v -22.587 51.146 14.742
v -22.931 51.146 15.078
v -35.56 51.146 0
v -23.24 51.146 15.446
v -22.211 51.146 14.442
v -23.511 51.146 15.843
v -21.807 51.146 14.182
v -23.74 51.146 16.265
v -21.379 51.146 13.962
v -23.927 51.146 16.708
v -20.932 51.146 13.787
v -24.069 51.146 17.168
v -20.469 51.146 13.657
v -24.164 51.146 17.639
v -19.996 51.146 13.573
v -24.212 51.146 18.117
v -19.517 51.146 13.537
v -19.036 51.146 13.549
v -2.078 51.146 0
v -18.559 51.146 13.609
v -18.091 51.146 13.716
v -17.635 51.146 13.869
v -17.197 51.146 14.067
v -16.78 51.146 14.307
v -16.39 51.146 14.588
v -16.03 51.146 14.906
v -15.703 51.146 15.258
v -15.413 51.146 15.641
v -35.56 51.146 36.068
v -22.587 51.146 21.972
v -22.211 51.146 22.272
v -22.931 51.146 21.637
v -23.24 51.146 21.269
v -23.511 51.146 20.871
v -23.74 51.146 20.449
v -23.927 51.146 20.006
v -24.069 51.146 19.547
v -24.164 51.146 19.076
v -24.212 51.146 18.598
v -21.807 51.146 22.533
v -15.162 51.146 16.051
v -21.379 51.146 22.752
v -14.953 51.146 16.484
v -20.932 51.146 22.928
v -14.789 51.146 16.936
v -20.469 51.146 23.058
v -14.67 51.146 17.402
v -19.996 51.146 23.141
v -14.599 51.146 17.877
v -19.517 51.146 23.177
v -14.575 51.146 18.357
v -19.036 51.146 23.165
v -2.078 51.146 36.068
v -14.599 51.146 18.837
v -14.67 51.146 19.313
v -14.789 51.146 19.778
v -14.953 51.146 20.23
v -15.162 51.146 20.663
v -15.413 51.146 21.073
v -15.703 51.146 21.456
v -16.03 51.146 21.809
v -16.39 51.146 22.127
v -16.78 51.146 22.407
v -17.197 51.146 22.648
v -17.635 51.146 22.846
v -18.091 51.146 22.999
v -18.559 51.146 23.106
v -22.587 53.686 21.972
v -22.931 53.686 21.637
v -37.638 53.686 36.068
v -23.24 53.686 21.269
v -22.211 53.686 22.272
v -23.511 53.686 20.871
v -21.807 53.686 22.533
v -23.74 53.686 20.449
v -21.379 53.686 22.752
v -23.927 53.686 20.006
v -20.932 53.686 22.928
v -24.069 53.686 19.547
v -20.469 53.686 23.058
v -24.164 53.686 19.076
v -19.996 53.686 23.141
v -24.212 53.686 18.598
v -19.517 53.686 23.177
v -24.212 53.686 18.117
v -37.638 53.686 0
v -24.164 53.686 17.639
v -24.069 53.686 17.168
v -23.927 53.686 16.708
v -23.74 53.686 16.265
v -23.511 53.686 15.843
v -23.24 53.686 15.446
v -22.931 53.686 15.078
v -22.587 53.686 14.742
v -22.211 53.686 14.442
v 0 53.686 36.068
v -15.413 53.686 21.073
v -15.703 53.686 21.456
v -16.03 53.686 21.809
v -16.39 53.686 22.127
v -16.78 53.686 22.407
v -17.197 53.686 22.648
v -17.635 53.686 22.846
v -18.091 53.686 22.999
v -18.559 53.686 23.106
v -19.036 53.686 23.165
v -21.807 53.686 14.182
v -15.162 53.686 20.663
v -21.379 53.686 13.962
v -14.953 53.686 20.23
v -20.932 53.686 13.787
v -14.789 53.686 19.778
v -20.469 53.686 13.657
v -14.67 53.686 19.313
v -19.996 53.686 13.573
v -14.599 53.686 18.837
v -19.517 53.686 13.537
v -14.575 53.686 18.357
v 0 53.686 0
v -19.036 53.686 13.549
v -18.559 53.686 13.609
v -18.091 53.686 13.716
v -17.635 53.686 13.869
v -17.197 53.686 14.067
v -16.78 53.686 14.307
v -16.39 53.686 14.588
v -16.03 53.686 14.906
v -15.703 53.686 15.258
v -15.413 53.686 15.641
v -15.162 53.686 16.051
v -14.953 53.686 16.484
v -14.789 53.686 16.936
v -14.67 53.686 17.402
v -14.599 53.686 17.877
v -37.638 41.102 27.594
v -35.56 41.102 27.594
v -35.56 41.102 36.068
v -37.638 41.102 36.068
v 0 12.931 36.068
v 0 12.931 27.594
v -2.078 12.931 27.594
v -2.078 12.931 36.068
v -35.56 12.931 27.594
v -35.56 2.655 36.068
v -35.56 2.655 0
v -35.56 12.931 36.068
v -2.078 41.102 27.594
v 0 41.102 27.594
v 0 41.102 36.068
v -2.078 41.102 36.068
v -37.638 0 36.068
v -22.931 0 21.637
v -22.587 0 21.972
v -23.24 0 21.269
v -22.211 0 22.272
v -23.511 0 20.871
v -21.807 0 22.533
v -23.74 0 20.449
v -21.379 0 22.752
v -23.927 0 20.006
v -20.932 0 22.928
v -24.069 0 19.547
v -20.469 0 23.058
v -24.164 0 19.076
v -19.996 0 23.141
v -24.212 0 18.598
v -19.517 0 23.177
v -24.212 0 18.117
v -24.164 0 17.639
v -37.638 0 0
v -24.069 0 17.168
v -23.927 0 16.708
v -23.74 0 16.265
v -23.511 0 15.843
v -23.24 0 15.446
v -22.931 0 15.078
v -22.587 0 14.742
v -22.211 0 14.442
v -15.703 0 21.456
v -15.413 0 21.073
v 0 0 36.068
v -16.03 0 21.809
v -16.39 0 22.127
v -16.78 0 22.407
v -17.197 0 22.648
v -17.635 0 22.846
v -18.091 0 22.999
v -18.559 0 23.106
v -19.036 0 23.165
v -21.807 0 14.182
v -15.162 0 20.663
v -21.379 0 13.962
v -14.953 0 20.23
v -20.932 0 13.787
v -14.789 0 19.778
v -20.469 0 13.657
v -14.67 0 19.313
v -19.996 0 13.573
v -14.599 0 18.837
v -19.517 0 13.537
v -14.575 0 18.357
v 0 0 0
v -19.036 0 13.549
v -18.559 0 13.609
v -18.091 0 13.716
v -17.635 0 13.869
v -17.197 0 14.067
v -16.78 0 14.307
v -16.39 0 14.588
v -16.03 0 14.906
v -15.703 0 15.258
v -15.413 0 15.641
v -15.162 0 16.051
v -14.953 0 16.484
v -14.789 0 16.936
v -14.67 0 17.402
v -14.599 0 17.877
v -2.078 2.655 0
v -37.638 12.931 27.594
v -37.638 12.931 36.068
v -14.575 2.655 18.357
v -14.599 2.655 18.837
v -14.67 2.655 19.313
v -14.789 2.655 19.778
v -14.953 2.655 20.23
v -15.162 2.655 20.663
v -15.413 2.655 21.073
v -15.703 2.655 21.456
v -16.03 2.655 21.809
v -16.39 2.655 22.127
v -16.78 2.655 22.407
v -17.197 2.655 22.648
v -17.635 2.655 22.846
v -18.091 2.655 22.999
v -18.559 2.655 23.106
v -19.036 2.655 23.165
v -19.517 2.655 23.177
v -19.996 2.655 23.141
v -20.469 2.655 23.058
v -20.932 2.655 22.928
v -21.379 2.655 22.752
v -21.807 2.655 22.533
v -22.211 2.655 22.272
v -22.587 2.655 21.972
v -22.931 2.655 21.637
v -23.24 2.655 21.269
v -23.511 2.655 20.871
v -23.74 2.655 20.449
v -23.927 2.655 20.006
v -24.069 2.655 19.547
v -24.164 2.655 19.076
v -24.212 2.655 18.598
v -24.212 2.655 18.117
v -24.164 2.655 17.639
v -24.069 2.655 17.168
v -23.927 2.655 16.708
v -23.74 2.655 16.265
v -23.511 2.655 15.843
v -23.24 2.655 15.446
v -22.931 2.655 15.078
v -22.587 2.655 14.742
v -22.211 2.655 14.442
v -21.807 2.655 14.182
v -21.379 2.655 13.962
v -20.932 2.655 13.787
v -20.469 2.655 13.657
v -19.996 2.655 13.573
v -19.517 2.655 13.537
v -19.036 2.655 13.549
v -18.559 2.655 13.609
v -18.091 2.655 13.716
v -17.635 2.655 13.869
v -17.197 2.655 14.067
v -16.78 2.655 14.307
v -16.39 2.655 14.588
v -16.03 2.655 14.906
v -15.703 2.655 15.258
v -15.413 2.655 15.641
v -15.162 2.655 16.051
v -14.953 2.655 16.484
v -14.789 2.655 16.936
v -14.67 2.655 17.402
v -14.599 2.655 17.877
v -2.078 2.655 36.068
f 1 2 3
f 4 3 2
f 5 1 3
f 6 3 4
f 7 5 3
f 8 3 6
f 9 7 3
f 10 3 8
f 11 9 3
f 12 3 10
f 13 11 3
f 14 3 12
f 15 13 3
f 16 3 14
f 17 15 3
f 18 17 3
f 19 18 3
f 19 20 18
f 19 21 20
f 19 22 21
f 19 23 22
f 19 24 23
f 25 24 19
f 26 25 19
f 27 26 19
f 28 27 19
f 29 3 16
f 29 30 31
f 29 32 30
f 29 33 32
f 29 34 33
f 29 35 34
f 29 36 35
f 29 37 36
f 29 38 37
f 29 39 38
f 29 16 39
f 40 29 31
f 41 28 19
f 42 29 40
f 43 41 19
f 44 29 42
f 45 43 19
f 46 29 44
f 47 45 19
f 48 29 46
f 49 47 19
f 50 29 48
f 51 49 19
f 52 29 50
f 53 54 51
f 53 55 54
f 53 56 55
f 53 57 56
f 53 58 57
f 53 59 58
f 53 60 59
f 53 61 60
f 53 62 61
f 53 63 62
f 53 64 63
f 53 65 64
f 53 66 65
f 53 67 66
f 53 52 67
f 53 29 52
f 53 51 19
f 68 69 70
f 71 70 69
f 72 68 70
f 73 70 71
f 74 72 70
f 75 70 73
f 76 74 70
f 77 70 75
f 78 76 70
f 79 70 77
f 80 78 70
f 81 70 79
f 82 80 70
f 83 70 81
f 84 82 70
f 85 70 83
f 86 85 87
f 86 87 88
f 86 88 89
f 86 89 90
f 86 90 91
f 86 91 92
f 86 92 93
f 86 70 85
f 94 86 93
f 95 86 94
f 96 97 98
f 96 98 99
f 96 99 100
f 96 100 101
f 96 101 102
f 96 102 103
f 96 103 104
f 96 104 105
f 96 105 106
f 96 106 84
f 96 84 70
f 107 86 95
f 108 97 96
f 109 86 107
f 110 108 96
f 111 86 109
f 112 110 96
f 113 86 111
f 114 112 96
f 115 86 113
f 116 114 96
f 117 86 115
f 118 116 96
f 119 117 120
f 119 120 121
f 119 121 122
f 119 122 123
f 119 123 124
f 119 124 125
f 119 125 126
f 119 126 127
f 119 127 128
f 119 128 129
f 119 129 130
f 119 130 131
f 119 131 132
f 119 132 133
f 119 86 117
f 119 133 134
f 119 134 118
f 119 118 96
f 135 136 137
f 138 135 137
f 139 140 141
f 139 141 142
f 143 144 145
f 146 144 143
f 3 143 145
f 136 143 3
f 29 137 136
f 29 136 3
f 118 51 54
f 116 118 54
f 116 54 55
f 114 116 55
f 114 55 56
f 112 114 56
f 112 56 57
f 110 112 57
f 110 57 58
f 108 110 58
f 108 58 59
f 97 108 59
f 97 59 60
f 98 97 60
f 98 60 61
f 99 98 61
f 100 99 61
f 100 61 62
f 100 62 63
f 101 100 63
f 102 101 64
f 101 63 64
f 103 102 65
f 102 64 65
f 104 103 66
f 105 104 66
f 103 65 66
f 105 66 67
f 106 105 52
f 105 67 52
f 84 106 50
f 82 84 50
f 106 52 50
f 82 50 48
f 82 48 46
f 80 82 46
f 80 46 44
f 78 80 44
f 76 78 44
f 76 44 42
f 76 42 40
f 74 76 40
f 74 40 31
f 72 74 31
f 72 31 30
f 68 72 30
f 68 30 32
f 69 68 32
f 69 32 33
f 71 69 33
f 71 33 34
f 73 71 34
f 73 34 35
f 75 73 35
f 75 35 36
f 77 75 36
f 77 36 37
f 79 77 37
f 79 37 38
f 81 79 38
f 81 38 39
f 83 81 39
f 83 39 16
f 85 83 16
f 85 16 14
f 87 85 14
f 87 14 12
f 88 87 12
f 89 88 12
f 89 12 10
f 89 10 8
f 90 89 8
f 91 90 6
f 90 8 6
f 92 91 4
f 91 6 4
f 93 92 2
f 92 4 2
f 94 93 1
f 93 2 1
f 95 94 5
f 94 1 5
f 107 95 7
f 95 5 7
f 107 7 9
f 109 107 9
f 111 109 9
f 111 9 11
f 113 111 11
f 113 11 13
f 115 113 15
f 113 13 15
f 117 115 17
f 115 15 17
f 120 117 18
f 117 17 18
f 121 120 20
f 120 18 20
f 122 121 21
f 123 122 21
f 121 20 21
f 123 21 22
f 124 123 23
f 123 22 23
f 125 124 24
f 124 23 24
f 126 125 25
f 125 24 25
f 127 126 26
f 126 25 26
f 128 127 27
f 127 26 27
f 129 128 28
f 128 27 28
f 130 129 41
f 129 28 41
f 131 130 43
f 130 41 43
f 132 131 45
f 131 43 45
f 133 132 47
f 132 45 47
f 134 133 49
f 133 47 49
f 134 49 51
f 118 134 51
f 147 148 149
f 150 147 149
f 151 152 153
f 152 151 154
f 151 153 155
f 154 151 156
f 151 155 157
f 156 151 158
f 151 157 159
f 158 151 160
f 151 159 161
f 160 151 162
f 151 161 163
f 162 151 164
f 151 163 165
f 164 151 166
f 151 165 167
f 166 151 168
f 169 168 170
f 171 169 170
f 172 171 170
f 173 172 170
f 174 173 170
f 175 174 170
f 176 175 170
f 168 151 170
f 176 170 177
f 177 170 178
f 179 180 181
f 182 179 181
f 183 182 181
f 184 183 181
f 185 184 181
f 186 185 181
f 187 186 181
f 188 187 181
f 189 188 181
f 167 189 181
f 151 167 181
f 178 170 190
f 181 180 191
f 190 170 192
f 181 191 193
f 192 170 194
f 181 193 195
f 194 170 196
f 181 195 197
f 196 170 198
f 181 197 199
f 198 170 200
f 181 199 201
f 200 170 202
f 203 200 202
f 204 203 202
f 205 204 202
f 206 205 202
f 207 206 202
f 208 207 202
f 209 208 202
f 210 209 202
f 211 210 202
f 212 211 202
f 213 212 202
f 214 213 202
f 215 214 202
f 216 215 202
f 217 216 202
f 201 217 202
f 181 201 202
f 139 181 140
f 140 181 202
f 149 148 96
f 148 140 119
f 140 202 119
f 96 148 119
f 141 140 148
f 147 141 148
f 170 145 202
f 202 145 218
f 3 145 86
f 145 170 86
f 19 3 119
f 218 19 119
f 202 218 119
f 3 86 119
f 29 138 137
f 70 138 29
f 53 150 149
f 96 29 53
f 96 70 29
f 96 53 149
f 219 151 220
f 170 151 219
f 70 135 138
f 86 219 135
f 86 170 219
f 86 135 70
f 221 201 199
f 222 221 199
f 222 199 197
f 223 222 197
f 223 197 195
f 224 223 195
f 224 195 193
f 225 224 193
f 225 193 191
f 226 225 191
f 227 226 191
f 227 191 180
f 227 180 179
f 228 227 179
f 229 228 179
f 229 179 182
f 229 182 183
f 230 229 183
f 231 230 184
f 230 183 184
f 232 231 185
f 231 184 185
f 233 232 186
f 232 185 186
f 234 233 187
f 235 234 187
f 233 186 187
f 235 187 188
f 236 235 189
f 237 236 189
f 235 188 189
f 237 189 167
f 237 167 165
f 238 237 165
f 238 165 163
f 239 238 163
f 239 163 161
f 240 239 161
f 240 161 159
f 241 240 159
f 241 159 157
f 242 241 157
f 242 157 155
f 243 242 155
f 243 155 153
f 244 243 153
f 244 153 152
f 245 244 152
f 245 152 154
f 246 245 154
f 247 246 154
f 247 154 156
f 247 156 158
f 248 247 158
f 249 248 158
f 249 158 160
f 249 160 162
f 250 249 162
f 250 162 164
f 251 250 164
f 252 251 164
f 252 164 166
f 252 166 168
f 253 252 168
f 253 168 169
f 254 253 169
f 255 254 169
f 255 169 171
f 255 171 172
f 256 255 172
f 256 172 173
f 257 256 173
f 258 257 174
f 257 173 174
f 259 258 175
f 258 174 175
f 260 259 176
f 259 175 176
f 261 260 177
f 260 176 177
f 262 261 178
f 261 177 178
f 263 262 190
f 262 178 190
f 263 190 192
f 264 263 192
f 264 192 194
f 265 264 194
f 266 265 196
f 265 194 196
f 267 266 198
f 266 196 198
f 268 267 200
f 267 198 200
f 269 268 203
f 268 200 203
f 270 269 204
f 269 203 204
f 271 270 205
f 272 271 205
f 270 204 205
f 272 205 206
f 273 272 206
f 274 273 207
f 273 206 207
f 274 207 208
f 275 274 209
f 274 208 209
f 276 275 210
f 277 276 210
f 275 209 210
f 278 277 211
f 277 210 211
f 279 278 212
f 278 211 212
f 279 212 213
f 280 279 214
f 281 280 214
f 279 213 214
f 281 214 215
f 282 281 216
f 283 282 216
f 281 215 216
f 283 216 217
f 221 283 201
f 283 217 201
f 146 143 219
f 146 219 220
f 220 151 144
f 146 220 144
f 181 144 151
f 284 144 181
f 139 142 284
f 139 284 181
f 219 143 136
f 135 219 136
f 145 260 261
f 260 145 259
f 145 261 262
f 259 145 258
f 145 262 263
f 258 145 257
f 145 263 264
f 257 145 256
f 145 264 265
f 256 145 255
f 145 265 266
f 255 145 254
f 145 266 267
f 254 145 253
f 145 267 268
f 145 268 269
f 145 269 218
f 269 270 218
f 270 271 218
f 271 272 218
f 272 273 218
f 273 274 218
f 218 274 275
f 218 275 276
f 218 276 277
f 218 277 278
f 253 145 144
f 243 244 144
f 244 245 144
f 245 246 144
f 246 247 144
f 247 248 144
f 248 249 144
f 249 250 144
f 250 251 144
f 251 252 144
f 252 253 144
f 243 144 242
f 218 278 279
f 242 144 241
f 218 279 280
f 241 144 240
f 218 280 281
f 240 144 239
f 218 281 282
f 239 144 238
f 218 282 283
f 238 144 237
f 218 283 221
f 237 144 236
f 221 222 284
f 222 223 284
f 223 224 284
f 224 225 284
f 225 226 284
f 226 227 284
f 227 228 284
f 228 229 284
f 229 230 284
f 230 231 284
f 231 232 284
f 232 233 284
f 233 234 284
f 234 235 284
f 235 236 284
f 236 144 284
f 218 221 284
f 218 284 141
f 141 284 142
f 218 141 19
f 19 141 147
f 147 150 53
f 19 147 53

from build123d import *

# Parameters (mm, degrees)
F0_W     = 37.6381836832
F0_H     = 53.6863617599
F1_DEPTH = 36.068
F2_W     = 33.4818195552
F2_H     = 48.4909075312
F3_DEPTH = 49.53
F4_W     = 28.1709078699
F4_H     = 8.4743649774
F5_DEPTH = 90.17
F6_R     = 4.8215246932
F7_DEPTH = 119.126


with BuildPart() as f1:
    # F0 (on Top) → F1 (new body)
    with BuildSketch(Plane.XY):
        with Locations((-18.8190918416, 26.84318088)):
            Rectangle(F0_W, F0_H)
    extrude(amount=F1_DEPTH)

    # F2 (on face) → F3 (cut)
    with BuildSketch(Plane.XY.offset(36.068)):
        with Locations((-18.8190909103, 26.9009082112)):
            Rectangle(F2_W, F2_H)
    extrude(amount=-F3_DEPTH, mode=Mode.SUBTRACT)

    # F4 (on face) → F5 (cut)
    with BuildSketch(Plane.YZ):
        with Locations((27.0163631067, 31.8308175113)):
            Rectangle(F4_W, F4_H)
    extrude(amount=-F5_DEPTH, mode=Mode.SUBTRACT)

    # F6 (on face) → F7 (cut)
    with BuildSketch(Plane.XZ):
        with Locations((-19.3963646889, 18.3572731912)):
            Circle(F6_R)
    extrude(amount=-F7_DEPTH, mode=Mode.SUBTRACT)


solid = f1.part
